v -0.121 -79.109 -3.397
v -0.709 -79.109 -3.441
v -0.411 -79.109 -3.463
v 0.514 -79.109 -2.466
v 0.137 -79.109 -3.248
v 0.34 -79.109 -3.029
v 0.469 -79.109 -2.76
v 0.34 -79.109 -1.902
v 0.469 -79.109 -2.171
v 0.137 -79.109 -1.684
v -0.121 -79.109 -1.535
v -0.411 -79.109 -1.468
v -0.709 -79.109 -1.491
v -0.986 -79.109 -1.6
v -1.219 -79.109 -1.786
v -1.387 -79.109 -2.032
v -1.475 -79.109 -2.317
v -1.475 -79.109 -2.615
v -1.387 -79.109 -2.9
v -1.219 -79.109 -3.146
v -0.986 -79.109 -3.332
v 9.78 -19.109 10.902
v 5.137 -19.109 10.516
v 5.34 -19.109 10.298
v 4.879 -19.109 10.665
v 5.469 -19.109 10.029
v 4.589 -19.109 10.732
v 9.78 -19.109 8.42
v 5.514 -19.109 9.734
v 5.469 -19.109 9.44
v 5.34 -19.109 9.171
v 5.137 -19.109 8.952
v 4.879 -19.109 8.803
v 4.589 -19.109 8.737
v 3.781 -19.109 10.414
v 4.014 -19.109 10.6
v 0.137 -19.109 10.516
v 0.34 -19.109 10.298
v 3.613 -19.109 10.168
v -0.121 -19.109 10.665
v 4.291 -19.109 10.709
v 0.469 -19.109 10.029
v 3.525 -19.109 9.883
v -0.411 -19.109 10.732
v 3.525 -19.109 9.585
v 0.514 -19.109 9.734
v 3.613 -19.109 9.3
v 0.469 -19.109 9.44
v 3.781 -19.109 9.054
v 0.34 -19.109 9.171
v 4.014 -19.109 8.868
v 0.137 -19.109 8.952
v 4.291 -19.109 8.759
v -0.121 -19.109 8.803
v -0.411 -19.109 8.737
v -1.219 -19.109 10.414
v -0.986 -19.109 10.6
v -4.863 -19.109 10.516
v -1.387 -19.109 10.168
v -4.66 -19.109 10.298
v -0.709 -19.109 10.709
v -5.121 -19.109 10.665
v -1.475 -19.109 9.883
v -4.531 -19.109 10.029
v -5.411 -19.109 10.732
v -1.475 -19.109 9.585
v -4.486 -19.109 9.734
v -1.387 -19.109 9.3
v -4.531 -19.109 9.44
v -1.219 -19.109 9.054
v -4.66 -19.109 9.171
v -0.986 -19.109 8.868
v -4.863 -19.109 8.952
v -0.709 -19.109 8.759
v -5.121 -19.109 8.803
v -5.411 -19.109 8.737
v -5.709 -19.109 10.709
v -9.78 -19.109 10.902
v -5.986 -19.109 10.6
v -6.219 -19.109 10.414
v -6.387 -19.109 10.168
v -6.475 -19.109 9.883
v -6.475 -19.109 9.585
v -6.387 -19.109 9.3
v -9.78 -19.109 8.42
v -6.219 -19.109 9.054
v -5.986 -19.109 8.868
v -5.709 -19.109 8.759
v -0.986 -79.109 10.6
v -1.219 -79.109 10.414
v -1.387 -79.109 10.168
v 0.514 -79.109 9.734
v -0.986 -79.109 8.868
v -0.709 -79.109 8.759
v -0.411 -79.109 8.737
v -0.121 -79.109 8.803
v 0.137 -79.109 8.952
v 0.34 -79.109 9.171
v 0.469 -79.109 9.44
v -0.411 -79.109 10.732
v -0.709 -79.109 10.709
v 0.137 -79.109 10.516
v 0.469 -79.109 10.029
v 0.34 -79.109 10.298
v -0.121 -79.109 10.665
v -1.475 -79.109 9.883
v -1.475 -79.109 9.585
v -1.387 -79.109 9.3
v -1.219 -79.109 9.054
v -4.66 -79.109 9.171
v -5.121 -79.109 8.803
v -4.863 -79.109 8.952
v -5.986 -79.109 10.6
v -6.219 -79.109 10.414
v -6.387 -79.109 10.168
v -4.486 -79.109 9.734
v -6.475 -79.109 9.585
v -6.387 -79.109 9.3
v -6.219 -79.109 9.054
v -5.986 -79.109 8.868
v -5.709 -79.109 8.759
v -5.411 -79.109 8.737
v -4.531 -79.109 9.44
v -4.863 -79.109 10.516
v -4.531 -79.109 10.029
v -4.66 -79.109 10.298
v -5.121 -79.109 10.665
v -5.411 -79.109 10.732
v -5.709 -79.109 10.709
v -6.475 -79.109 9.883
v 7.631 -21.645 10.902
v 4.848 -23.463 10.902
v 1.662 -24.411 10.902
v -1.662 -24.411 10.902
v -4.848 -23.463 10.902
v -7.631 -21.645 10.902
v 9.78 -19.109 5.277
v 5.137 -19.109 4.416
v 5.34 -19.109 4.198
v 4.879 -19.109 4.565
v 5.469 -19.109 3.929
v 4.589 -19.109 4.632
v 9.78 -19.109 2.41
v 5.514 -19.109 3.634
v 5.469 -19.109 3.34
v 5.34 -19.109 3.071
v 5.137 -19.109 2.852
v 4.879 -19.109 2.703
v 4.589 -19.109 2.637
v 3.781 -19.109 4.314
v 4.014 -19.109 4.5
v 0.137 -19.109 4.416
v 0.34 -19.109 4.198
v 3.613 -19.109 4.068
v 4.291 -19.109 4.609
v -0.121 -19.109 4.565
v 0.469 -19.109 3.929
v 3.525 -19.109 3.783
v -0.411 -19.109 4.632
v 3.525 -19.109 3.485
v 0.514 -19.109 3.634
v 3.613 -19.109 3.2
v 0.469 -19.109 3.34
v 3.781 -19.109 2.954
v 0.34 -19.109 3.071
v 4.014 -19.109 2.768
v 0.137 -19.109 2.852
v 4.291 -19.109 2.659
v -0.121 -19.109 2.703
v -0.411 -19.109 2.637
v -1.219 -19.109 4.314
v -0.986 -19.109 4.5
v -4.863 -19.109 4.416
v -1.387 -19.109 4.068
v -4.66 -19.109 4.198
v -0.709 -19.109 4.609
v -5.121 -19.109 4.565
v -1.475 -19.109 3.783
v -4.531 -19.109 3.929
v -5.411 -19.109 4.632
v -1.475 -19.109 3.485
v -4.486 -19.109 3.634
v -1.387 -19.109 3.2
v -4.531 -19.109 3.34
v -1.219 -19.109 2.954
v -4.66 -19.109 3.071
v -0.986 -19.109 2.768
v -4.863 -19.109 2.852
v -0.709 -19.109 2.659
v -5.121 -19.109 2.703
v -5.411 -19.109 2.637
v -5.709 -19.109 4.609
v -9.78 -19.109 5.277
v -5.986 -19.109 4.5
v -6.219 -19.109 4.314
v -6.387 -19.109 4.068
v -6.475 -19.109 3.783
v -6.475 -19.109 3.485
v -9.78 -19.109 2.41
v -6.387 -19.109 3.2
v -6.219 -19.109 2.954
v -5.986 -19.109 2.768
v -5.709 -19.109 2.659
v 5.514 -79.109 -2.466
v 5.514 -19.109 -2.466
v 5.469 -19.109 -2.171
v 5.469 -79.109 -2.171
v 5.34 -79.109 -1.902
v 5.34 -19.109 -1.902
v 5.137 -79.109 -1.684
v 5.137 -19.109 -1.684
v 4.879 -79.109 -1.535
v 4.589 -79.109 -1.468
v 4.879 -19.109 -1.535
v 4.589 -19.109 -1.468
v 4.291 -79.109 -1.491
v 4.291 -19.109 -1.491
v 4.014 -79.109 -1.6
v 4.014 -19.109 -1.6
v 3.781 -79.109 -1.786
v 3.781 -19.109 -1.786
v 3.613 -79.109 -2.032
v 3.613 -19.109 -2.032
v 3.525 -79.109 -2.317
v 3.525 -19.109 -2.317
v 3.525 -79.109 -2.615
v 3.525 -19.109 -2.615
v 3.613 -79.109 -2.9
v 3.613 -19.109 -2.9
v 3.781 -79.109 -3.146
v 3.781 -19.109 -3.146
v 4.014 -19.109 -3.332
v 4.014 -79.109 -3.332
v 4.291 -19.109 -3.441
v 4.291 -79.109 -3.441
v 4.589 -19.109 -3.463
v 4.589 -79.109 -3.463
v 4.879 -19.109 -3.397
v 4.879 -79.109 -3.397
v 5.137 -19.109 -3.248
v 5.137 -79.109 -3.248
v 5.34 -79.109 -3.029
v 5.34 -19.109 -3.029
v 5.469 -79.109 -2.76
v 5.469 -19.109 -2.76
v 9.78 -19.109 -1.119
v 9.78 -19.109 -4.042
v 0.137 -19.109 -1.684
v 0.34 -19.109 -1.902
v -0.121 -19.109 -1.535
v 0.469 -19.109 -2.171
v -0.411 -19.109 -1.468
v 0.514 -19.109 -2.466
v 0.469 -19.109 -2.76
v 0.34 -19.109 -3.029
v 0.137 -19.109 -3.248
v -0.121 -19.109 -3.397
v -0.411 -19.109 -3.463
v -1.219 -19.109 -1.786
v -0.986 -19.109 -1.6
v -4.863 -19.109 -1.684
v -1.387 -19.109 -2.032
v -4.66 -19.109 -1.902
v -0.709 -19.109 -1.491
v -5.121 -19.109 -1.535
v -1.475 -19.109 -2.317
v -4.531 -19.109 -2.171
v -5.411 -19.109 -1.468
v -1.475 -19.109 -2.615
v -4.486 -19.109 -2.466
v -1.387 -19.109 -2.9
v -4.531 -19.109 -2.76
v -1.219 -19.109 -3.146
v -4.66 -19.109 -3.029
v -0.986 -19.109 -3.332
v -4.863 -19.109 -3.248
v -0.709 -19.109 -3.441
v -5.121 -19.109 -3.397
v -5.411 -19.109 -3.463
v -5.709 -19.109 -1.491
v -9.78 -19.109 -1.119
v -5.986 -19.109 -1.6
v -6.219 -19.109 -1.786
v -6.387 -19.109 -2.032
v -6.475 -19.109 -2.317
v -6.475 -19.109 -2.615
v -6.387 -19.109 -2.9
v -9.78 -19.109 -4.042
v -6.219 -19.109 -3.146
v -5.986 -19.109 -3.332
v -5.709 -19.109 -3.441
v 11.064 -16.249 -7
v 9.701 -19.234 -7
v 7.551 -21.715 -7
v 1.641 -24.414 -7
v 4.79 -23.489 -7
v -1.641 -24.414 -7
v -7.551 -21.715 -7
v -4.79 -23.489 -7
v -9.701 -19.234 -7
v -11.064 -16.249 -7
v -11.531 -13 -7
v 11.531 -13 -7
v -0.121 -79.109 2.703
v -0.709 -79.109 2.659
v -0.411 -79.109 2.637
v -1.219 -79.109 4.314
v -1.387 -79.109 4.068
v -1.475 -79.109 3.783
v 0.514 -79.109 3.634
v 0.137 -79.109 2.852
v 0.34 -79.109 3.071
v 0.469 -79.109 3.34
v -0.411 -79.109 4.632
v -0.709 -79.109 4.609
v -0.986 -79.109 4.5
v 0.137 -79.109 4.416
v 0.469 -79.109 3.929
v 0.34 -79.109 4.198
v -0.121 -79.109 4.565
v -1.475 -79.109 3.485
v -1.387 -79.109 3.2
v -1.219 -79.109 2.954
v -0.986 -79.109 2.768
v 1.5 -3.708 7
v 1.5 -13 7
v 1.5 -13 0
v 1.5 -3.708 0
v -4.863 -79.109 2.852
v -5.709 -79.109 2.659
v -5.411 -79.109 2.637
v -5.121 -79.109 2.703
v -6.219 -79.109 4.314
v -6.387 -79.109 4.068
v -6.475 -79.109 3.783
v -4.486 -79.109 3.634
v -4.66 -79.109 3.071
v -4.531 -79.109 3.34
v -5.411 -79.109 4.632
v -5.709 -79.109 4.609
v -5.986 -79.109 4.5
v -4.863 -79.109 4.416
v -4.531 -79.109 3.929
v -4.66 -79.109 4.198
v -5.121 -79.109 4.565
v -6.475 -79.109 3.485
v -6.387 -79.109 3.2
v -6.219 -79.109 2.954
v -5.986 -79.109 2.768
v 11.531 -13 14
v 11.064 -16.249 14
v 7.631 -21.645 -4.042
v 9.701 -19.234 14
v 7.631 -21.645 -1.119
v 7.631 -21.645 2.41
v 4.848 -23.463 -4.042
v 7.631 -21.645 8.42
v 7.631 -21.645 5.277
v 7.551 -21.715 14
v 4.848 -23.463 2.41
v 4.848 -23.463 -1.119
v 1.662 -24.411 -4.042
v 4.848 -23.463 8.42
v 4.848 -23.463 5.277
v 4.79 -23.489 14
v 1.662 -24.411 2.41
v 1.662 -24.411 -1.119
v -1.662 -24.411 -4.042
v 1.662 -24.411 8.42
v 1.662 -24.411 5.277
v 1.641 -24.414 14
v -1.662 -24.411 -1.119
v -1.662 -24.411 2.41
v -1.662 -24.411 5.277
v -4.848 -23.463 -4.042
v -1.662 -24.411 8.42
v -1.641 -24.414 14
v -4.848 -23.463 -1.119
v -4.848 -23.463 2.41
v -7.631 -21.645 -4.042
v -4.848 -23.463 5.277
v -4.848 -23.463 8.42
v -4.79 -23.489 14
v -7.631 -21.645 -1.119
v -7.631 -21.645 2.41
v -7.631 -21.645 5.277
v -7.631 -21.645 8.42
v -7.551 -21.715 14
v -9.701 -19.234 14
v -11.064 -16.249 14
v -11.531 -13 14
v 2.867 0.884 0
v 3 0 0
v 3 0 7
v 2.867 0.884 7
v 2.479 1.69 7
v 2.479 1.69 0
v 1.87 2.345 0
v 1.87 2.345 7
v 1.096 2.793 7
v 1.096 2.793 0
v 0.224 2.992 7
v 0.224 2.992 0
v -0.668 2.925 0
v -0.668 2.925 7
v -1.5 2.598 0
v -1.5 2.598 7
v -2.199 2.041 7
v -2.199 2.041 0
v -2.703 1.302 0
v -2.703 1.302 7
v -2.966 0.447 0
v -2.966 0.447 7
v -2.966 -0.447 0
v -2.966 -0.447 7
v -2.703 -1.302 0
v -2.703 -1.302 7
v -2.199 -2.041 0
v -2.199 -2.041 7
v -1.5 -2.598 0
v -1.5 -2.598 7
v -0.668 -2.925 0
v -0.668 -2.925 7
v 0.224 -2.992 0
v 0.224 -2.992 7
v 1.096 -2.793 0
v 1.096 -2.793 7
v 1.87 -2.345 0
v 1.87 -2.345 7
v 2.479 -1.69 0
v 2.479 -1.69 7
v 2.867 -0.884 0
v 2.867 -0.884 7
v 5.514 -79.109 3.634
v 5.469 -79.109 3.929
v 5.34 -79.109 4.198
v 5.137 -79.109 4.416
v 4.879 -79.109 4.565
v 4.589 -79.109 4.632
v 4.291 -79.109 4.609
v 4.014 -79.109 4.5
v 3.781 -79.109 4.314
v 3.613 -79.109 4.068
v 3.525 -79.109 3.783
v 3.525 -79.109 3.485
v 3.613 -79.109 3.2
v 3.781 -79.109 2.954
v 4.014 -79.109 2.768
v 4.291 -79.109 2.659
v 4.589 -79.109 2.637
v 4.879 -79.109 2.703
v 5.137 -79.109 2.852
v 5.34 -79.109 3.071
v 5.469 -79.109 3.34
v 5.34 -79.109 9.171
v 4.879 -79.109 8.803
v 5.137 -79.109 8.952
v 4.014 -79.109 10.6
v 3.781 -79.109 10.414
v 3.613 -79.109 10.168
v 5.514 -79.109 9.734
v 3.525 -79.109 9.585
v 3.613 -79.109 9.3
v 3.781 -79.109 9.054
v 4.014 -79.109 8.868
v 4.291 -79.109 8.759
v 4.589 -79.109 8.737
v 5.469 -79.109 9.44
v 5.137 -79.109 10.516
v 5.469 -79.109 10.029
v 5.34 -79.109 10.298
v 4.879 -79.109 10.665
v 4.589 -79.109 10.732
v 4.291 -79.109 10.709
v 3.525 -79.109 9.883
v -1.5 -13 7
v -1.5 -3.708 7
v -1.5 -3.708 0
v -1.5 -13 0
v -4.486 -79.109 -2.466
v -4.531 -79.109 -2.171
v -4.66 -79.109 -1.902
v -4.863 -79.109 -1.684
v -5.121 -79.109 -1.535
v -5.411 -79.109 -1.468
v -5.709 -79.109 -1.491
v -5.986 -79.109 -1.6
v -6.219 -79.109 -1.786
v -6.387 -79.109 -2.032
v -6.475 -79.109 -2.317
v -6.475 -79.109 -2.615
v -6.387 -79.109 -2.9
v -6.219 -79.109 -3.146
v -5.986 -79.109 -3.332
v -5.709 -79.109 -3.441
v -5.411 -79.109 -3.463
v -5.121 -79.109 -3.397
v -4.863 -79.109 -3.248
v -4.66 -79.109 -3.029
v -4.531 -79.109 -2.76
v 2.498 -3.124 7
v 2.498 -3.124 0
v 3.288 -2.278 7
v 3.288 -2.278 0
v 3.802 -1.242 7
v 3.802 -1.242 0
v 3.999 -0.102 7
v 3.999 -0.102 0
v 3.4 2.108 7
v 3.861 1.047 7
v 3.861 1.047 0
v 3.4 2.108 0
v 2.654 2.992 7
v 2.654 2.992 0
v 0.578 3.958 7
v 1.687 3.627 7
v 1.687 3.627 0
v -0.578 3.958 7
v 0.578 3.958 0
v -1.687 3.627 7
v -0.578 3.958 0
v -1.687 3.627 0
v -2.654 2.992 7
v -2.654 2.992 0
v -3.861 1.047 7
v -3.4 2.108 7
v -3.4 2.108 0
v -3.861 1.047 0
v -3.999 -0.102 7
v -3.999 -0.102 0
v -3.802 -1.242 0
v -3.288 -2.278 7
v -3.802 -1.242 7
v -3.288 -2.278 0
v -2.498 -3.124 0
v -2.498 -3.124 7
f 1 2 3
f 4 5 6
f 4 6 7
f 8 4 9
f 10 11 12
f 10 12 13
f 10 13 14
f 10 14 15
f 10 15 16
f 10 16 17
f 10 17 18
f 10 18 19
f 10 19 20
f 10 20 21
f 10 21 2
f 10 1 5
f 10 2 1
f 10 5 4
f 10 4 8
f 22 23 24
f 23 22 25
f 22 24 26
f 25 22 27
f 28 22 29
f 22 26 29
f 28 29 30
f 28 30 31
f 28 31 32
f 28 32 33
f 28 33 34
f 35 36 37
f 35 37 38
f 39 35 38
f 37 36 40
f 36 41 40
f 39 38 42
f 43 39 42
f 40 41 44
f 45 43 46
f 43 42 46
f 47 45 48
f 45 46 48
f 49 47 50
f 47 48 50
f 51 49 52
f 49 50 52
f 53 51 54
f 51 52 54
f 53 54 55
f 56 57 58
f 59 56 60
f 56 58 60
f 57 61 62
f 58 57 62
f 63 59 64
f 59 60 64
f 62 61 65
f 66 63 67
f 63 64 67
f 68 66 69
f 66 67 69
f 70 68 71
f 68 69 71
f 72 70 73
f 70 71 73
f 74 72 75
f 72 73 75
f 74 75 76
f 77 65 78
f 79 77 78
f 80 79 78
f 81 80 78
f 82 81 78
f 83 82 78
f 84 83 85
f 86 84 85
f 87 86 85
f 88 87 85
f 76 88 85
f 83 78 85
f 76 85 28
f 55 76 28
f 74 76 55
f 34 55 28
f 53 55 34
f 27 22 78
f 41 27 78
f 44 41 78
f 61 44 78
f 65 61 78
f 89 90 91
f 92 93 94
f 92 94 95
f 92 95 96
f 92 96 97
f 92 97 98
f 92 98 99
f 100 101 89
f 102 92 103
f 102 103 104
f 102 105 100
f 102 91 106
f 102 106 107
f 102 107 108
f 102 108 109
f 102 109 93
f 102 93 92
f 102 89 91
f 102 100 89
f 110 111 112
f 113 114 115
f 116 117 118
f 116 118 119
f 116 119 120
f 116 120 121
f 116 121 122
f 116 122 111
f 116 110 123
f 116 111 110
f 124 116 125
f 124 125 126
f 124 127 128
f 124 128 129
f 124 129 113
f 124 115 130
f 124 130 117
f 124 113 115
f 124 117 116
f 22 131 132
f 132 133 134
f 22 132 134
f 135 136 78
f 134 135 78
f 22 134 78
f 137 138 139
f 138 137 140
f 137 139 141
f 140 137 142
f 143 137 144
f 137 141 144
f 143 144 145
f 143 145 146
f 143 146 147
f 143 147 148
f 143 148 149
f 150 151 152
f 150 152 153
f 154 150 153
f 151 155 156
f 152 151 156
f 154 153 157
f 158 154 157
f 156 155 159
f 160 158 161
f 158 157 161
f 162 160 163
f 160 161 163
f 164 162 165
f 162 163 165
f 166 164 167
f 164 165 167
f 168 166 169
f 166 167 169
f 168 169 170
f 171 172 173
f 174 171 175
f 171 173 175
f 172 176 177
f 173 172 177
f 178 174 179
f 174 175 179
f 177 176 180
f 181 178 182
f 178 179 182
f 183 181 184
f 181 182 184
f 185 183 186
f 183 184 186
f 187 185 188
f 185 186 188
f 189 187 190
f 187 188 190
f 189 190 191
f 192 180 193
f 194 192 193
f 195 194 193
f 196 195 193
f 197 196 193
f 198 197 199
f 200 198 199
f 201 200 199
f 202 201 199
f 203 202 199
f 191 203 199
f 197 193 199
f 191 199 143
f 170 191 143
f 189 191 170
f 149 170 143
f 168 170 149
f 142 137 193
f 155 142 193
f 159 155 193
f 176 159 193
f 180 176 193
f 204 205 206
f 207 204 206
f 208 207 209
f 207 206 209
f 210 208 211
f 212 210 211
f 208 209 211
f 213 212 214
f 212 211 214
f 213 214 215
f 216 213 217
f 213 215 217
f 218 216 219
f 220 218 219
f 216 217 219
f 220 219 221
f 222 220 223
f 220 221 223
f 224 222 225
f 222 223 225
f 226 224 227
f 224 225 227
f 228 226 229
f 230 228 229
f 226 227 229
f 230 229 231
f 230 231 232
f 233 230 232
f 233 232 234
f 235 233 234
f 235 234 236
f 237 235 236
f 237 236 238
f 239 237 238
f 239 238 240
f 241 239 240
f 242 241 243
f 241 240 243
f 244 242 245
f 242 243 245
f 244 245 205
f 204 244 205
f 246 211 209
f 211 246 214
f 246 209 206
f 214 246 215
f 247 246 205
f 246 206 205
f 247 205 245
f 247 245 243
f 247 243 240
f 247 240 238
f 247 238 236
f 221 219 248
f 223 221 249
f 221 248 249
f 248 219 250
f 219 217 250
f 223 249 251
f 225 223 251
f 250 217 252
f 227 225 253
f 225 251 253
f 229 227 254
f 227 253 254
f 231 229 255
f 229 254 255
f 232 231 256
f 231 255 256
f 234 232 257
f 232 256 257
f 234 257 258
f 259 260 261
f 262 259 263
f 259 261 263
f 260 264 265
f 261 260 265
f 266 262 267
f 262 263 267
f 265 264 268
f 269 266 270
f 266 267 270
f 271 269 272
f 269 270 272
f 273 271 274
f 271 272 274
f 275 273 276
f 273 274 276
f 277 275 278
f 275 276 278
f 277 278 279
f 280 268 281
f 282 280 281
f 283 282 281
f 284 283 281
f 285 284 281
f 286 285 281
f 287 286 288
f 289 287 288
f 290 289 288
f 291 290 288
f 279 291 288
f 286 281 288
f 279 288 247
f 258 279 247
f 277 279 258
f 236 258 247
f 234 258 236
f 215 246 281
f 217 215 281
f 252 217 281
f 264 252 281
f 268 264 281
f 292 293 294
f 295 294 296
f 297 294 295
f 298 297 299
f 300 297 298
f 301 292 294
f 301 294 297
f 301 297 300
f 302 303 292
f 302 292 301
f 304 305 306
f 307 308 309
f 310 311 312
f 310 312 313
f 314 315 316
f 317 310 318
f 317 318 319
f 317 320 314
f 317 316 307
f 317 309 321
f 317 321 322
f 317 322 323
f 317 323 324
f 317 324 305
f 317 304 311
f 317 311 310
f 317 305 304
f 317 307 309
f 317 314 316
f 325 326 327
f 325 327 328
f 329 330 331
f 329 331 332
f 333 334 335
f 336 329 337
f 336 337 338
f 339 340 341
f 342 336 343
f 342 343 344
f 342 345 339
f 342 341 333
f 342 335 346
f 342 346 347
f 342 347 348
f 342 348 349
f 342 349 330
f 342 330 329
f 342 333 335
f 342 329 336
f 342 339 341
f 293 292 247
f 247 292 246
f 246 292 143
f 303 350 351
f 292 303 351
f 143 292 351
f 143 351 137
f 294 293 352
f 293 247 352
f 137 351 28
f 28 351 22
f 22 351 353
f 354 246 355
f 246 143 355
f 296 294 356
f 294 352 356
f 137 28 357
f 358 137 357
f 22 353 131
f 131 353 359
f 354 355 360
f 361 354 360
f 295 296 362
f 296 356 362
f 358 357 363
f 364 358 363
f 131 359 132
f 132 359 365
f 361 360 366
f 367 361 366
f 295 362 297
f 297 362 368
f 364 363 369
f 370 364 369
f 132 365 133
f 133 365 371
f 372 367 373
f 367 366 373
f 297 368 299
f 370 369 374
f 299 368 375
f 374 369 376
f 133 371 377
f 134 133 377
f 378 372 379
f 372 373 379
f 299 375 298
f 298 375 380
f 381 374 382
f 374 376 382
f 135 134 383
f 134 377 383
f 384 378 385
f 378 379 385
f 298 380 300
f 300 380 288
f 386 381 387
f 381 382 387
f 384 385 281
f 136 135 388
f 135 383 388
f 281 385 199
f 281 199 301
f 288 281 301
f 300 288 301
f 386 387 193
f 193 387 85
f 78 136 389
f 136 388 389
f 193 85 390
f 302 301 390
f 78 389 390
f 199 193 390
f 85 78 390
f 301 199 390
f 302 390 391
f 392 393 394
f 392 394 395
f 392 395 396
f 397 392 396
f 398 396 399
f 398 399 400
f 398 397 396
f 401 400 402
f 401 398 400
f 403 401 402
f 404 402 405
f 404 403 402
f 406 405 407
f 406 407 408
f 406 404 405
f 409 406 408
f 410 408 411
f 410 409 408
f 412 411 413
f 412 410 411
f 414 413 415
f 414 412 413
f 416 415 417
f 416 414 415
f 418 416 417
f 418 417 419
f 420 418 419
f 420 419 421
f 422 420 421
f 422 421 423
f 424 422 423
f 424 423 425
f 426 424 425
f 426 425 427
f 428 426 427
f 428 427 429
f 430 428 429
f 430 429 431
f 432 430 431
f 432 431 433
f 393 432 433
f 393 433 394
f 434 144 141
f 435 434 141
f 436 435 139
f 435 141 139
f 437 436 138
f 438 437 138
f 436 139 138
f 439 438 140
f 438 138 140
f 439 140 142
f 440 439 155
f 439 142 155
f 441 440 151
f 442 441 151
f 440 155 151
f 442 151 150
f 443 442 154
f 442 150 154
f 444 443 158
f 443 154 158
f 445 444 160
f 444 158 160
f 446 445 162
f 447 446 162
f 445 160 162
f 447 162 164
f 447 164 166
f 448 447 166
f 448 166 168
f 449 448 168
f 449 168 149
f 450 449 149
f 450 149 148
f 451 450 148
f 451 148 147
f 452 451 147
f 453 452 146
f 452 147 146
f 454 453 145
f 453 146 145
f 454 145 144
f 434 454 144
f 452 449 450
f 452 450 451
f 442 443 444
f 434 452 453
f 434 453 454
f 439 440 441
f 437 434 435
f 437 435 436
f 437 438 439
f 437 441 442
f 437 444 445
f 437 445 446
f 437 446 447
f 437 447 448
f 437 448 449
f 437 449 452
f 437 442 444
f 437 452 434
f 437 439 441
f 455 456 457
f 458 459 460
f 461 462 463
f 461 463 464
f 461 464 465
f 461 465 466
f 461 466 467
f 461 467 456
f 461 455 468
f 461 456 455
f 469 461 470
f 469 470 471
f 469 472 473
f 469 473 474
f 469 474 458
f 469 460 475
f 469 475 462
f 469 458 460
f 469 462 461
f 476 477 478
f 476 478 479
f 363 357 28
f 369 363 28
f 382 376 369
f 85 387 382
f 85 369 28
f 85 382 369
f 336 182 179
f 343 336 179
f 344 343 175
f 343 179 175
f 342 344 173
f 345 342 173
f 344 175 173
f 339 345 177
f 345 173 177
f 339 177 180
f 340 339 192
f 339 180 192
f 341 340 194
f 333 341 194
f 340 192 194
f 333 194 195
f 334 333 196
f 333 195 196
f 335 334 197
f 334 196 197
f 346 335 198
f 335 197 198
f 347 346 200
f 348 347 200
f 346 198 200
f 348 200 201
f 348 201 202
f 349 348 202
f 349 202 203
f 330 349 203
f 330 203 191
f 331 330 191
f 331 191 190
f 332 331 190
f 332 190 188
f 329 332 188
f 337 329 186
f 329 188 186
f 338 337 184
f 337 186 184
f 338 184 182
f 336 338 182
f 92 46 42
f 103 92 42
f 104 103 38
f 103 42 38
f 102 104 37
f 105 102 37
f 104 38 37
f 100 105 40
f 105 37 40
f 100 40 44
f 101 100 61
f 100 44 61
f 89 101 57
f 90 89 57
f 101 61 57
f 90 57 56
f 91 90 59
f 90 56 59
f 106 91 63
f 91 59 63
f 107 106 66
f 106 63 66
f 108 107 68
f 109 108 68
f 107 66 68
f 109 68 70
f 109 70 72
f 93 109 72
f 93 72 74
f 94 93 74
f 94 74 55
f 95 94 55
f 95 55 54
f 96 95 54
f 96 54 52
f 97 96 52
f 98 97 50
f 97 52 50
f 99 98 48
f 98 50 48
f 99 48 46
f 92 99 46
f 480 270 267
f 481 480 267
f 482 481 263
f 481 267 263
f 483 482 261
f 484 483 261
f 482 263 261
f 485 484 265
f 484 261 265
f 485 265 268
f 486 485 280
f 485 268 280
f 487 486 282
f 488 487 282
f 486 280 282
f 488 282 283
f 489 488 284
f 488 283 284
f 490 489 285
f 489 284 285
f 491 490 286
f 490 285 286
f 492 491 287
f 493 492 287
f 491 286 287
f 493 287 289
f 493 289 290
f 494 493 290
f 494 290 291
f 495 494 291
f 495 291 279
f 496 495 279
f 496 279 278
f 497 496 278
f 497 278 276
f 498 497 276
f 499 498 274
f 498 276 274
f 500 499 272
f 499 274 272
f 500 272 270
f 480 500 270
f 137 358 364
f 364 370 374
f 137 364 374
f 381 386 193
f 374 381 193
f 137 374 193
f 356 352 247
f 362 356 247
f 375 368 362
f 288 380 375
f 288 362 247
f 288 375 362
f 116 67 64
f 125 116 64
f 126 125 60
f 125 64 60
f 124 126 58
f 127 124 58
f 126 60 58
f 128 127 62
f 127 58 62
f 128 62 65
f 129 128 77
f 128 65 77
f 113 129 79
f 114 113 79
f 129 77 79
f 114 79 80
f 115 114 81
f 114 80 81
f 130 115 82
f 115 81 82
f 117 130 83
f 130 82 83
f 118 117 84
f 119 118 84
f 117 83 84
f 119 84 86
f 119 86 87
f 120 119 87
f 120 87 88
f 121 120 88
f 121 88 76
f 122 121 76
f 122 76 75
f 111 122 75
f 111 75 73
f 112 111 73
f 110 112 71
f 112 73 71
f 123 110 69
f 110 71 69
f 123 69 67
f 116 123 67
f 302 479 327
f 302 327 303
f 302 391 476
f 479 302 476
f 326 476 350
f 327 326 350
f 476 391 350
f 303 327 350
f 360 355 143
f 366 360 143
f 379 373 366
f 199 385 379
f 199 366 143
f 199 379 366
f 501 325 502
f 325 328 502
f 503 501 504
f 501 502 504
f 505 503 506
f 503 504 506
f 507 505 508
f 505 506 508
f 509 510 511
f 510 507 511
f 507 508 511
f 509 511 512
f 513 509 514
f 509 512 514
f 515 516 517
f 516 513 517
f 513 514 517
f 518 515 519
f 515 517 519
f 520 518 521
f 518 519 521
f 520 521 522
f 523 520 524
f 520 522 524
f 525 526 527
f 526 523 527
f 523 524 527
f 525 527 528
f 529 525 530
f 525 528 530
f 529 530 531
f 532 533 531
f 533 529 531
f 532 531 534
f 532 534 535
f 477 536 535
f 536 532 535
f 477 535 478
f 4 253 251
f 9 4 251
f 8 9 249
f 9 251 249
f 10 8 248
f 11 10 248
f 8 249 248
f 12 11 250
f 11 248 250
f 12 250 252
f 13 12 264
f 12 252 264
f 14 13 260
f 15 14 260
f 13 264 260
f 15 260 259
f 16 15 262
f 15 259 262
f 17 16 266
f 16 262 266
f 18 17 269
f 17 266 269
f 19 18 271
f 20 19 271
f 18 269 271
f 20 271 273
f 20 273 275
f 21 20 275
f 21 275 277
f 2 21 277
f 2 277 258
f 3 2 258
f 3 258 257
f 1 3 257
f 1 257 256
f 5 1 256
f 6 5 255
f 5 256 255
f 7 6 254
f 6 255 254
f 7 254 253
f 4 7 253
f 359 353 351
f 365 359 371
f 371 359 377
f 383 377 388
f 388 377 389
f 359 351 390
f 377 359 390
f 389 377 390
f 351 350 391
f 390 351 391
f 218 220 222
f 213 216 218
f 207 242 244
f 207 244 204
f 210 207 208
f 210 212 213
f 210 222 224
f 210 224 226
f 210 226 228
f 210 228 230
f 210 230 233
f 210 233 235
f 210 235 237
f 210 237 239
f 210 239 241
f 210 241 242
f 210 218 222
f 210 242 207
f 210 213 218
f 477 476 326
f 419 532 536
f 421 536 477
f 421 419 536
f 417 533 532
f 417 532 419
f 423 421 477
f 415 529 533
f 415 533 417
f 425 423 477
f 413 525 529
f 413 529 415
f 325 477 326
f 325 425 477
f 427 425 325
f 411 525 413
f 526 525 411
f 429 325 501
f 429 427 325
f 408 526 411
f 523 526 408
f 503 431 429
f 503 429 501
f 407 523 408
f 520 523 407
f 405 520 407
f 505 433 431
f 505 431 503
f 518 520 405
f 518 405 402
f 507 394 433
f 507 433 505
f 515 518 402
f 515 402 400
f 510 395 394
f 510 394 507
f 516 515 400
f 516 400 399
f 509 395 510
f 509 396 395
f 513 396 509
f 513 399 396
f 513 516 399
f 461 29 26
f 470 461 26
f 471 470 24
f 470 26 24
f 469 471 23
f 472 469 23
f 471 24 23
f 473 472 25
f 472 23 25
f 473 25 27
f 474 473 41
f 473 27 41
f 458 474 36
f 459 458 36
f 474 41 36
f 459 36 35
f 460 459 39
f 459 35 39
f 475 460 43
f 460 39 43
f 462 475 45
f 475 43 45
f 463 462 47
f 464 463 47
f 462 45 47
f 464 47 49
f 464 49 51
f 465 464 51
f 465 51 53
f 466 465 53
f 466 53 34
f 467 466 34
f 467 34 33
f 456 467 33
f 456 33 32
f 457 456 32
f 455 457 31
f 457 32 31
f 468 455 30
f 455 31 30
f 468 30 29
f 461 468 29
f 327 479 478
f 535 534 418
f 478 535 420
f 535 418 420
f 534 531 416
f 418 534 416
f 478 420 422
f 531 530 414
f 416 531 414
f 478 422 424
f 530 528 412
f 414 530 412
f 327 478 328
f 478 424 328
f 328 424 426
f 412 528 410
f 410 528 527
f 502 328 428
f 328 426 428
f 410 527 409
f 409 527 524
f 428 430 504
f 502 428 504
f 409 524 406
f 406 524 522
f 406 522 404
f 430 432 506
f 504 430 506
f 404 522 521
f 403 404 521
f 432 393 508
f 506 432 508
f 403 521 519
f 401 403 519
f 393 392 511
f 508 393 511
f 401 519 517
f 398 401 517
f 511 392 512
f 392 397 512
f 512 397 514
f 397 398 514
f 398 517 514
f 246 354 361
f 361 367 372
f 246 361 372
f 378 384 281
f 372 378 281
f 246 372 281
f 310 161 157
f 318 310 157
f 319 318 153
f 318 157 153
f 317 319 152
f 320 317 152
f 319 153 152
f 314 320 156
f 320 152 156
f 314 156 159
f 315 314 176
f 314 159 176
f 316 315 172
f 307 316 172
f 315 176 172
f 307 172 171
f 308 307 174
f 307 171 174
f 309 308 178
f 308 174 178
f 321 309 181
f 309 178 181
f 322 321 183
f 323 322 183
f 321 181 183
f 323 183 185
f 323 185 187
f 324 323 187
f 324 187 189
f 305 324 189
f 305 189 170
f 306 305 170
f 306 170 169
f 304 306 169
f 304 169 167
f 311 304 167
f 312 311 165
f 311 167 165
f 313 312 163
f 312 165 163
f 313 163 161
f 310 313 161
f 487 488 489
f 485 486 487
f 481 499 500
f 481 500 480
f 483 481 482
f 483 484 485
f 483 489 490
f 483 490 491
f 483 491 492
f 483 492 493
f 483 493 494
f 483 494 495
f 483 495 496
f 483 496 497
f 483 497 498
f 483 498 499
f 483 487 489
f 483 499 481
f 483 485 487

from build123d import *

# Parameters (mm, degrees)
SKETCH2_R                = 4
SKETCH2_R_2              = 3
BOSS_EXTRUDE1_DEPTH      = 7
BOSS_EXTRUDE2_DEPTH      = 7
BOSS_EXTRUDE3_DEPTH      = 7
BOSS_EXTRUDE3_DEPTH_BACK = 14
CUT_EXTRUDE2_DEPTH       = 169
CUT_EXTRUDE2_DEPTH_BACK  = 169
SKETCH5_W                = 2.481427535
SKETCH5_H                = 11.249138159
SKETCH5_W_2              = 2.867427374
SKETCH5_W_3              = 2.922570208
SKETCH6_R                = 1
BOSS_EXTRUDE5_DEPTH      = 60


with BuildPart() as part:
    # Sketch2 → Boss-Extrude1 (new body)
    with BuildSketch(Plane.XY):
        Circle(SKETCH2_R)
        Circle(SKETCH2_R_2, mode=Mode.SUBTRACT)
    extrude(amount=BOSS_EXTRUDE1_DEPTH)

    # Sketch3 → Boss-Extrude2 (add)
    with BuildSketch(Plane.XY.offset(7)):
        Polygon((0, -3), (-1.5, -3), (-1.5, -13), (1.5, -13), (1.5, -3), align=None)
    extrude(amount=-BOSS_EXTRUDE2_DEPTH)

    # Sketch4 → Boss-Extrude3 (add, two sides: drawn at the far end of the back side and taken through both)
    with BuildSketch(Plane.XY.offset(7).offset(-BOSS_EXTRUDE3_DEPTH_BACK)):
        with BuildLine():
            Line((1.5, -13), (11.531332628, -13))
            ThreePointArc((11.531332628, -13), (0, -24.531332628), (-11.531332628, -13))
            Line((-11.531332628, -13), (-1.5, -13))
            Line((-1.5, -13), (1.5, -13))
        make_face()
    extrude(amount=BOSS_EXTRUDE3_DEPTH + BOSS_EXTRUDE3_DEPTH_BACK)

    # Sketch5 → Cut-Extrude2 (cut, two sides: drawn at the far end of the back side and taken through both)
    with BuildSketch(Plane(origin=(1.5, 0, 0), x_dir=(0, 0, -1), z_dir=(1, 0, 0)).offset(-CUT_EXTRUDE2_DEPTH_BACK)):
        with Locations((-9.661011409, -24.733382447)):
            Rectangle(SKETCH5_W, SKETCH5_H)
        with Locations((-3.84344241, -24.733382447)):
            Rectangle(SKETCH5_W_2, SKETCH5_H)
        with Locations((2.580697764, -24.733382447)):
            Rectangle(SKETCH5_W_3, SKETCH5_H)
    extrude(amount=CUT_EXTRUDE2_DEPTH + CUT_EXTRUDE2_DEPTH_BACK, mode=Mode.SUBTRACT)

    # Sketch6 → Boss-Extrude5 (add)
    with BuildSketch(Plane.XZ.offset(19.108813367)):
        with Locations((-5.486205248, 9.734324146)):
            Circle(SKETCH6_R)
        with Locations((-0.486205248, 9.734324146)):
            Circle(SKETCH6_R)
        with Locations((4.513794752, 9.734324146)):
            Circle(SKETCH6_R)
        with Locations((-0.486205248, 3.634324146)):
            Circle(SKETCH6_R)
        with Locations((4.513794752, 3.634324146)):
            Circle(SKETCH6_R)
        with Locations((-0.486205248, -2.465675854)):
            Circle(SKETCH6_R)
        with Locations((4.513794752, -2.465675854)):
            Circle(SKETCH6_R)
        with Locations((-5.486205248, 3.634324146)):
            Circle(SKETCH6_R)
        with Locations((-5.486205248, -2.465675854)):
            Circle(SKETCH6_R)
    extrude(amount=BOSS_EXTRUDE5_DEPTH)


solid = part.part
